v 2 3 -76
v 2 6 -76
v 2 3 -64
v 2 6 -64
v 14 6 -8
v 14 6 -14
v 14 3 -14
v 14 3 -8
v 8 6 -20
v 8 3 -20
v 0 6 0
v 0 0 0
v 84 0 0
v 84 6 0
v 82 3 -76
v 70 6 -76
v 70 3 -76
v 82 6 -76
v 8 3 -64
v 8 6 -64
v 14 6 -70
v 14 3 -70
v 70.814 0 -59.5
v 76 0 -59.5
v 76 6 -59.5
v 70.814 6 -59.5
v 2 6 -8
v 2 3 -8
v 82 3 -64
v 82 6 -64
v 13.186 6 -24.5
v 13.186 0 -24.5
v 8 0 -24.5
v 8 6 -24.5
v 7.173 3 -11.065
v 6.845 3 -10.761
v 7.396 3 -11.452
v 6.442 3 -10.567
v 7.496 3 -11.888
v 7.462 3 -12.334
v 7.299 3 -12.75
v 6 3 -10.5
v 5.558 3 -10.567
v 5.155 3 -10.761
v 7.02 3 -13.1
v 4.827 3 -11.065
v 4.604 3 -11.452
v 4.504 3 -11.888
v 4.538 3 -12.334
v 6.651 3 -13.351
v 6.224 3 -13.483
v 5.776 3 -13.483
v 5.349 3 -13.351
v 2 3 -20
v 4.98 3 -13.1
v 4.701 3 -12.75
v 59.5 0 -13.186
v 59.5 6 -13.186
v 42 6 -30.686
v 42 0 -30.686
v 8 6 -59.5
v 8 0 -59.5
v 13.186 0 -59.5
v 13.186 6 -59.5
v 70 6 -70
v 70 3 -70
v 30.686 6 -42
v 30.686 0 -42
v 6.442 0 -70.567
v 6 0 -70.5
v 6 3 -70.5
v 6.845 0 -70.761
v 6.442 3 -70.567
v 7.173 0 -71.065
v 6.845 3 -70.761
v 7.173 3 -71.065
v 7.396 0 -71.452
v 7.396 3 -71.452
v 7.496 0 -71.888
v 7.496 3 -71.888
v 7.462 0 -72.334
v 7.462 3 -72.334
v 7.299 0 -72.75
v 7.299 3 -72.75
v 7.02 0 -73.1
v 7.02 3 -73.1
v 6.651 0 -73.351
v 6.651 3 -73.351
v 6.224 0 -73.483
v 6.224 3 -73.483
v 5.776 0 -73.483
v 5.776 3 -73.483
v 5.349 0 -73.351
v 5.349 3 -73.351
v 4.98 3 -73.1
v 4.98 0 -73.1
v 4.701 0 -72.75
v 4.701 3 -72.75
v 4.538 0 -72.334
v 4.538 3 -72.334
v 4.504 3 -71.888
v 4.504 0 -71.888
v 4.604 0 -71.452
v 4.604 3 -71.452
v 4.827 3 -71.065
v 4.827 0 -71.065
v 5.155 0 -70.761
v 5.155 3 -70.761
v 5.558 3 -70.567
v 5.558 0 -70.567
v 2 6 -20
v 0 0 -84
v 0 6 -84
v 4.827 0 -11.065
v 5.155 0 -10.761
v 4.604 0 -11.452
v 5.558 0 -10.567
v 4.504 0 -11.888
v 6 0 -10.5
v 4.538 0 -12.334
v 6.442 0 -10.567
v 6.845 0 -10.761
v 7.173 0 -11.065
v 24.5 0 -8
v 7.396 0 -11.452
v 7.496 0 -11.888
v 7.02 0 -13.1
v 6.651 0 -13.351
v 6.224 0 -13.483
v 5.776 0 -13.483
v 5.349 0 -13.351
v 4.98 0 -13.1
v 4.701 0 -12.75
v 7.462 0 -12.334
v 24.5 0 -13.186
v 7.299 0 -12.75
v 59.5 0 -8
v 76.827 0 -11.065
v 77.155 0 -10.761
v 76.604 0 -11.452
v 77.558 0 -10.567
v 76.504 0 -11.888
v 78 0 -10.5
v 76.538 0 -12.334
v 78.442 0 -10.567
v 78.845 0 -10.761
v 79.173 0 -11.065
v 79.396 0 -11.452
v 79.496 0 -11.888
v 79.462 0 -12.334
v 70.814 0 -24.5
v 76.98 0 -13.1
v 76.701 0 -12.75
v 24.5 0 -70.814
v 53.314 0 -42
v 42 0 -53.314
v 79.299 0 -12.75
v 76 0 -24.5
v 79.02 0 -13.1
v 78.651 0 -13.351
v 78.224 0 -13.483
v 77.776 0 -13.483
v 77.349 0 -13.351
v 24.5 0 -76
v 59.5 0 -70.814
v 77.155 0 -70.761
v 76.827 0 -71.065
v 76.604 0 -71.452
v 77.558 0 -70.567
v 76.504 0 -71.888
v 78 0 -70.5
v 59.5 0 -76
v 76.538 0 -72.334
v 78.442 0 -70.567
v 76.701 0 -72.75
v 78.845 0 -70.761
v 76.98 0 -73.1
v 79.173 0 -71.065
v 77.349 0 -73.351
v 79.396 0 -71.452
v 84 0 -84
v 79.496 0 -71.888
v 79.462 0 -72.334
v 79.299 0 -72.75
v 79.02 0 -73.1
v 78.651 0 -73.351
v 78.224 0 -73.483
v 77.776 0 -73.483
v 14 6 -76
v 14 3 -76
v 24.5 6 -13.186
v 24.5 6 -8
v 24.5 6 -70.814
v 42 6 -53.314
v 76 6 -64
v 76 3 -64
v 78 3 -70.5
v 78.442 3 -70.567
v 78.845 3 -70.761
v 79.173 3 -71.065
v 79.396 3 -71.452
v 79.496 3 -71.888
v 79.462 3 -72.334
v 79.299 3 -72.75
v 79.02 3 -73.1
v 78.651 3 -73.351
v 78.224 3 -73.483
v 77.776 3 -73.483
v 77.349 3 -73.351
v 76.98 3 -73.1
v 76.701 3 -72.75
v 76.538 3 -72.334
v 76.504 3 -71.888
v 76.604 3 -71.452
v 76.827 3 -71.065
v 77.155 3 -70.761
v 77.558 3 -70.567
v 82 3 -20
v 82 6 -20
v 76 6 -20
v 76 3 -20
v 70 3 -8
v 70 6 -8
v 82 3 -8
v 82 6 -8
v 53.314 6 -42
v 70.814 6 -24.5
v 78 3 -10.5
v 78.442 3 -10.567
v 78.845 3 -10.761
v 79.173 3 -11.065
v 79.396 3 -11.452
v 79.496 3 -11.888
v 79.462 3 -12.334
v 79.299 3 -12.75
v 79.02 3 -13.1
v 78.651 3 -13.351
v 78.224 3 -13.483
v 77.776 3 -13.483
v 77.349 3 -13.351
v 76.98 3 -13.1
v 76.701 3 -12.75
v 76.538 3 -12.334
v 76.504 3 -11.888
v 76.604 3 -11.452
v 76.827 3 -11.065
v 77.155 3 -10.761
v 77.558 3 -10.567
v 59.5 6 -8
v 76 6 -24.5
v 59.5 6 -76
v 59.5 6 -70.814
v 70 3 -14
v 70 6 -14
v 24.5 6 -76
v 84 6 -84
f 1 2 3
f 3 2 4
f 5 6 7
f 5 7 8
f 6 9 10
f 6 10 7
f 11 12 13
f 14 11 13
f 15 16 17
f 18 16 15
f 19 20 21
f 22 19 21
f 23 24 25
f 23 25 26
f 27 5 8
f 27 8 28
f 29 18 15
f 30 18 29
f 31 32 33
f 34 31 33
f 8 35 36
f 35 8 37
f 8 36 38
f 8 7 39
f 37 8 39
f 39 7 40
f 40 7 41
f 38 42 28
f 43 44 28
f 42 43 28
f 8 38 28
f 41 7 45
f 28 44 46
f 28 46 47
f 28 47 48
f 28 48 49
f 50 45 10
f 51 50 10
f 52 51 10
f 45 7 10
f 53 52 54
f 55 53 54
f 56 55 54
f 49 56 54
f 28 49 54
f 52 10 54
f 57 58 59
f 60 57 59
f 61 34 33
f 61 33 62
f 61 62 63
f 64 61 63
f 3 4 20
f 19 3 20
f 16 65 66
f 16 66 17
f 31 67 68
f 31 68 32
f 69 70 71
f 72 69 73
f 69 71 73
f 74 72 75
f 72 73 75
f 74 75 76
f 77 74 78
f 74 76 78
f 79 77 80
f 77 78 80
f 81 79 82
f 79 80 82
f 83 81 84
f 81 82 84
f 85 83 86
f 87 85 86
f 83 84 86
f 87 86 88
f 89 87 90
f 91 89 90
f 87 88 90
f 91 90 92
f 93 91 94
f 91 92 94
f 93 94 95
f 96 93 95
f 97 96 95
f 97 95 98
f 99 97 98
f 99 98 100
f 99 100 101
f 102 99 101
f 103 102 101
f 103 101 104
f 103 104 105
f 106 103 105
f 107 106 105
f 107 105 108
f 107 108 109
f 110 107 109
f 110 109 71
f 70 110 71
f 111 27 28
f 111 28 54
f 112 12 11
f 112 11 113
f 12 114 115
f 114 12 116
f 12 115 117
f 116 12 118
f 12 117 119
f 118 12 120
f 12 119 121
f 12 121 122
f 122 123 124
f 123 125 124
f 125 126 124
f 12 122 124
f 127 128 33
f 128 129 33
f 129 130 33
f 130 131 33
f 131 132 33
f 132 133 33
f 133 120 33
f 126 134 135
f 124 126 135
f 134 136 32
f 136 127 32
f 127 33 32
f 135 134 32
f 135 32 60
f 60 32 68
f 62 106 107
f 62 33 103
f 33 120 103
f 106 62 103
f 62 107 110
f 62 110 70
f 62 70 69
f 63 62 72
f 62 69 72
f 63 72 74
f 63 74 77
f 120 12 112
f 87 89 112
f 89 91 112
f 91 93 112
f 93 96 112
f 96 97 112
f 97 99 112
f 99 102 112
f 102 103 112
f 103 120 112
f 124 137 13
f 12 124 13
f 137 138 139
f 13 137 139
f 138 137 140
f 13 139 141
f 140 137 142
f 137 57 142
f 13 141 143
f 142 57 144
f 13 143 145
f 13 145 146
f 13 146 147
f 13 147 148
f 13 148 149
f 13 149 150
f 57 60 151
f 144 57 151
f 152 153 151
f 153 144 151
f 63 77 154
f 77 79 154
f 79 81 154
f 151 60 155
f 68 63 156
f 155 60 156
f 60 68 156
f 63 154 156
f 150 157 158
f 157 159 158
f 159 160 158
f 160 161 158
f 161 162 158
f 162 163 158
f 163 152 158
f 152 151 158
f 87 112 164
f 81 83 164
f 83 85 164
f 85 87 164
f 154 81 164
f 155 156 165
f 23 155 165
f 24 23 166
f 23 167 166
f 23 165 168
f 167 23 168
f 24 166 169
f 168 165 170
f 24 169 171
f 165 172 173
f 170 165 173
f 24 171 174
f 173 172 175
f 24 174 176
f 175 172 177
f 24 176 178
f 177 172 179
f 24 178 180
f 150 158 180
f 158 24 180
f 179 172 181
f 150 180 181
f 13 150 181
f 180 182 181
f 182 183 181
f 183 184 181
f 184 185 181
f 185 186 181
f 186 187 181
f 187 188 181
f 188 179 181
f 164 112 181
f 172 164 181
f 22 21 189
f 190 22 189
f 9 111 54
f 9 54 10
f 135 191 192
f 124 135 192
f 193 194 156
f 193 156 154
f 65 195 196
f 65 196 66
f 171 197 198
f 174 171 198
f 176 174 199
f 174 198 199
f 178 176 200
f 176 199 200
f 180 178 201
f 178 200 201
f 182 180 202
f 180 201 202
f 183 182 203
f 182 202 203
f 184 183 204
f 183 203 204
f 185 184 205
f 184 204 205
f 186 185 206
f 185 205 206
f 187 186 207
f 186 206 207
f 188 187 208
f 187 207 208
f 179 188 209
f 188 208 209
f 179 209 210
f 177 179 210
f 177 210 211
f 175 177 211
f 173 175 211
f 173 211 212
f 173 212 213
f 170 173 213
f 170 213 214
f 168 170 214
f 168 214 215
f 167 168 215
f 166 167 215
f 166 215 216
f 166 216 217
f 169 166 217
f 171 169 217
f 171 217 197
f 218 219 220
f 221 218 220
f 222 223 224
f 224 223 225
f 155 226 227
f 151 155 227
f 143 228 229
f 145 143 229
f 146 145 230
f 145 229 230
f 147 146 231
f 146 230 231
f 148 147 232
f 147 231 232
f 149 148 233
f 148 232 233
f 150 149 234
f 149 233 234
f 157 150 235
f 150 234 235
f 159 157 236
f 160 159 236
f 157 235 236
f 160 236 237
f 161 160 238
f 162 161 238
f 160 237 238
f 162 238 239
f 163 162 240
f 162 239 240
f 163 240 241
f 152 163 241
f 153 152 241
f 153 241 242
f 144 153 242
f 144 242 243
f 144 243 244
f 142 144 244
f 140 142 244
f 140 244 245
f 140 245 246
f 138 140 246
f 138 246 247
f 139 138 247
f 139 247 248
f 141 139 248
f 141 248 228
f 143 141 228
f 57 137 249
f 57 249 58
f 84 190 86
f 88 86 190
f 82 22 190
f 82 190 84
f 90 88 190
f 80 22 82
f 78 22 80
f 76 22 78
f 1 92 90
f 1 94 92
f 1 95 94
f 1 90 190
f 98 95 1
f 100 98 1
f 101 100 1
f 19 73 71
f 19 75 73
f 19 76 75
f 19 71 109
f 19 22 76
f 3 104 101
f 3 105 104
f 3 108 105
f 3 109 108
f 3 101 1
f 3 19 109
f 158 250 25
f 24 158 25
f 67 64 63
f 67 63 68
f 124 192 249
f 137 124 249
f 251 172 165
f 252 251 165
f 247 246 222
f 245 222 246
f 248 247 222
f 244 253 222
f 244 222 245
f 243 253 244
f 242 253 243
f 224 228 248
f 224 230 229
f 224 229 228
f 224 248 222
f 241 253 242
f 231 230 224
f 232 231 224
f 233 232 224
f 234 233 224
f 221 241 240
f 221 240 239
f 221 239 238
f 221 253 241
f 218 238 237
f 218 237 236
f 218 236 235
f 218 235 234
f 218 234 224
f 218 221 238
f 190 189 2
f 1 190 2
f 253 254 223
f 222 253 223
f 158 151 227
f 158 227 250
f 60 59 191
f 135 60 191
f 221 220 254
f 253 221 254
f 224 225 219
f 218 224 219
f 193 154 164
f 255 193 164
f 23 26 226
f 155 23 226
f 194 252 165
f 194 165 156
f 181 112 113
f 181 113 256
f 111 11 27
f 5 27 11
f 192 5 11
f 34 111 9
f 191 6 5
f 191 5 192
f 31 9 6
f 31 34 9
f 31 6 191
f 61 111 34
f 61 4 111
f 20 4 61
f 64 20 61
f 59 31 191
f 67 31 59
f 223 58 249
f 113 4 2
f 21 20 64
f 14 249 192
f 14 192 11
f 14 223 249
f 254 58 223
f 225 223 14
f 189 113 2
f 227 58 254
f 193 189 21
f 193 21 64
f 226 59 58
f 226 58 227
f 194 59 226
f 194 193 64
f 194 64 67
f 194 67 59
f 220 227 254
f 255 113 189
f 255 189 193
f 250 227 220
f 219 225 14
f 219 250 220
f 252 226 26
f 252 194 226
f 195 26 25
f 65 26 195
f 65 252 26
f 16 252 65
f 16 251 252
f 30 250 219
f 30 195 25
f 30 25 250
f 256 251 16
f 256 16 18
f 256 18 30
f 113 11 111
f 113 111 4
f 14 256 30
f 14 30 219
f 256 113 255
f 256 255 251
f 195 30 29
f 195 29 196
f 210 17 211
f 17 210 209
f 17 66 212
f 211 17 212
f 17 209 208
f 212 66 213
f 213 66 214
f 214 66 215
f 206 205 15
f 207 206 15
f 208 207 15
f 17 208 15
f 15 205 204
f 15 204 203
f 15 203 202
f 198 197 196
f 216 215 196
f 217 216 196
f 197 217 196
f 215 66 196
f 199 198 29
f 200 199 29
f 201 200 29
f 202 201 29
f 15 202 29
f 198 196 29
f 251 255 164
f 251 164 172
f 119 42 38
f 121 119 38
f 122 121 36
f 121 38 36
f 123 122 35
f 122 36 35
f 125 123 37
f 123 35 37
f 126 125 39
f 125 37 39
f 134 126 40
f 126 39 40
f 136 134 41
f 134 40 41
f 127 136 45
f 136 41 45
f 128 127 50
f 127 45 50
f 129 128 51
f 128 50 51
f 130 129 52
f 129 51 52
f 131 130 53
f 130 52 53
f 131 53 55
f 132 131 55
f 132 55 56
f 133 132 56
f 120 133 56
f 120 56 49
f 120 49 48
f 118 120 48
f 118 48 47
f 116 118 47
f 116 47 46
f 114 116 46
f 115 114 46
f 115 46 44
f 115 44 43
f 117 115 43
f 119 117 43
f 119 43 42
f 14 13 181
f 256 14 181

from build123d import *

# Parameters (mm, degrees)
SKETCH1_W                = 84
SKETCH1_H                = 84
BOSS_EXTRUDE1_DEPTH      = 6
SKETCH2_R                = 1.5
CUT_EXTRUDE1_DEPTH       = 119.94536561
CUT_EXTRUDE2_DEPTH       = 119.94536561
CIRPATTERN1_COUNT        = 3
CIRPATTERN1_ANGLE        = 180
CIRPATTERN1_COPY_1_DEPTH = 119.94536561
CIRPATTERN1_COPY_2_DEPTH = 119.94536561
SKETCH4_R                = 1.5
CUT_EXTRUDE4_DEPTH       = 3
MIRROR3_COPY_1_SKETCH_R  = 1.5
MIRROR3_COPY_1_DEPTH     = 3


with BuildPart() as part:
    # Sketch1 → Boss-Extrude1 (new body)
    with BuildSketch(Plane(origin=(0, 0, 0), x_dir=(1, 0, 0), z_dir=(0, 1, 0))):
        with Locations((42, 42)):
            Rectangle(SKETCH1_W, SKETCH1_H)
    extrude(amount=BOSS_EXTRUDE1_DEPTH)

    # Sketch2 → Cut-Extrude1 (cut, through all)
    with BuildSketch(Plane(origin=(0, 6, 0), x_dir=(1, 0, 0), z_dir=(0, 1, 0))):
        with Locations(Location((6, 72, 0), (0, 0, 270))):
            Circle(SKETCH2_R)
        with Locations(Location((6, 12, 0), (0, 0, 270))):
            Circle(SKETCH2_R)
        with Locations(Location((78, 12, 0), (0, 0, 270))):
            Circle(SKETCH2_R)
        with Locations(Location((78, 72, 0), (0, 0, 270))):
            Circle(SKETCH2_R)
    extrude(amount=-CUT_EXTRUDE1_DEPTH, mode=Mode.SUBTRACT)

    # Sketch3 → Cut-Extrude2 (cut, through all)
    with BuildSketch(Plane(origin=(0, 6, 0), x_dir=(1, 0, 0), z_dir=(0, 1, 0))):
        Polygon((24.5, 76), (59.5, 76), (59.5, 70.813708499), (42, 53.313708499), (24.5, 70.813708499), align=None)
    cut_extrude2 = extrude(amount=-CUT_EXTRUDE2_DEPTH, mode=Mode.SUBTRACT)

    # Mirror1: Cut-Extrude2 across plane
    add(cut_extrude2.mirror(Plane.XY.offset(-42)), mode=Mode.SUBTRACT)

    # CirPattern1: Cut-Extrude2 ×3 about axis
    cirpattern1_axis = Axis((42, 0, -42), (0, 1, 0))
    for i in range(1, CIRPATTERN1_COUNT):
        add(cut_extrude2.rotate(cirpattern1_axis, i * CIRPATTERN1_ANGLE / (CIRPATTERN1_COUNT - 1)), mode=Mode.SUBTRACT)

    # CirPattern1 copy 1 sketch → CirPattern1 copy 1 (cut, through all)
    with BuildSketch(Plane(origin=(0, 6, 0), x_dir=(0, 0, -1), z_dir=(0, 1, 0))):
        Polygon((24.5, -76), (59.5, -76), (59.5, -70.813708499), (42, -53.313708499), (24.5, -70.813708499), align=None)
    extrude(amount=-CIRPATTERN1_COPY_1_DEPTH, mode=Mode.SUBTRACT)

    # CirPattern1 copy 2 sketch → CirPattern1 copy 2 (cut, through all)
    with BuildSketch(Plane(origin=(84, 6, 0), x_dir=(-1, 0, 0), z_dir=(0, 1, 0))):
        Polygon((24.5, -76), (59.5, -76), (59.5, -70.813708499), (42, -53.313708499), (24.5, -70.813708499), align=None)
    extrude(amount=-CIRPATTERN1_COPY_2_DEPTH, mode=Mode.SUBTRACT)

    # Sketch4 → Cut-Extrude4 (cut)
    with BuildSketch(Plane(origin=(0, 6, 0), x_dir=(1, 0, 0), z_dir=(0, 1, 0))):
        Polygon((14, 14), (14, 8), (2, 8), (2, 20), (8, 20), align=None)
        with Locations(Location((6, 12, 0), (0, 0, 270))):
            Circle(SKETCH4_R, mode=Mode.SUBTRACT)
    cut_extrude4 = extrude(amount=-CUT_EXTRUDE4_DEPTH, mode=Mode.SUBTRACT)

    # Mirror2: Cut-Extrude4 across plane
    add(cut_extrude4.mirror(Plane.XY.offset(-42)), mode=Mode.SUBTRACT)

    # Mirror3: Cut-Extrude4 across plane
    add(cut_extrude4.mirror(Plane.ZY.offset(-42)), mode=Mode.SUBTRACT)

    # Mirror3 copy 1 sketch → Mirror3 copy 1 (cut)
    with BuildSketch(Plane(origin=(84, 6, -84), x_dir=(-1, 0, 0), z_dir=(0, 1, 0))):
        Polygon((14, 14), (14, 8), (2, 8), (2, 20), (8, 20), align=None)
        with Locations(Location((6, 12, 0), (0, 0, 270))):
            Circle(MIRROR3_COPY_1_SKETCH_R, mode=Mode.SUBTRACT)
    extrude(amount=-MIRROR3_COPY_1_DEPTH, mode=Mode.SUBTRACT)


solid = part.part
